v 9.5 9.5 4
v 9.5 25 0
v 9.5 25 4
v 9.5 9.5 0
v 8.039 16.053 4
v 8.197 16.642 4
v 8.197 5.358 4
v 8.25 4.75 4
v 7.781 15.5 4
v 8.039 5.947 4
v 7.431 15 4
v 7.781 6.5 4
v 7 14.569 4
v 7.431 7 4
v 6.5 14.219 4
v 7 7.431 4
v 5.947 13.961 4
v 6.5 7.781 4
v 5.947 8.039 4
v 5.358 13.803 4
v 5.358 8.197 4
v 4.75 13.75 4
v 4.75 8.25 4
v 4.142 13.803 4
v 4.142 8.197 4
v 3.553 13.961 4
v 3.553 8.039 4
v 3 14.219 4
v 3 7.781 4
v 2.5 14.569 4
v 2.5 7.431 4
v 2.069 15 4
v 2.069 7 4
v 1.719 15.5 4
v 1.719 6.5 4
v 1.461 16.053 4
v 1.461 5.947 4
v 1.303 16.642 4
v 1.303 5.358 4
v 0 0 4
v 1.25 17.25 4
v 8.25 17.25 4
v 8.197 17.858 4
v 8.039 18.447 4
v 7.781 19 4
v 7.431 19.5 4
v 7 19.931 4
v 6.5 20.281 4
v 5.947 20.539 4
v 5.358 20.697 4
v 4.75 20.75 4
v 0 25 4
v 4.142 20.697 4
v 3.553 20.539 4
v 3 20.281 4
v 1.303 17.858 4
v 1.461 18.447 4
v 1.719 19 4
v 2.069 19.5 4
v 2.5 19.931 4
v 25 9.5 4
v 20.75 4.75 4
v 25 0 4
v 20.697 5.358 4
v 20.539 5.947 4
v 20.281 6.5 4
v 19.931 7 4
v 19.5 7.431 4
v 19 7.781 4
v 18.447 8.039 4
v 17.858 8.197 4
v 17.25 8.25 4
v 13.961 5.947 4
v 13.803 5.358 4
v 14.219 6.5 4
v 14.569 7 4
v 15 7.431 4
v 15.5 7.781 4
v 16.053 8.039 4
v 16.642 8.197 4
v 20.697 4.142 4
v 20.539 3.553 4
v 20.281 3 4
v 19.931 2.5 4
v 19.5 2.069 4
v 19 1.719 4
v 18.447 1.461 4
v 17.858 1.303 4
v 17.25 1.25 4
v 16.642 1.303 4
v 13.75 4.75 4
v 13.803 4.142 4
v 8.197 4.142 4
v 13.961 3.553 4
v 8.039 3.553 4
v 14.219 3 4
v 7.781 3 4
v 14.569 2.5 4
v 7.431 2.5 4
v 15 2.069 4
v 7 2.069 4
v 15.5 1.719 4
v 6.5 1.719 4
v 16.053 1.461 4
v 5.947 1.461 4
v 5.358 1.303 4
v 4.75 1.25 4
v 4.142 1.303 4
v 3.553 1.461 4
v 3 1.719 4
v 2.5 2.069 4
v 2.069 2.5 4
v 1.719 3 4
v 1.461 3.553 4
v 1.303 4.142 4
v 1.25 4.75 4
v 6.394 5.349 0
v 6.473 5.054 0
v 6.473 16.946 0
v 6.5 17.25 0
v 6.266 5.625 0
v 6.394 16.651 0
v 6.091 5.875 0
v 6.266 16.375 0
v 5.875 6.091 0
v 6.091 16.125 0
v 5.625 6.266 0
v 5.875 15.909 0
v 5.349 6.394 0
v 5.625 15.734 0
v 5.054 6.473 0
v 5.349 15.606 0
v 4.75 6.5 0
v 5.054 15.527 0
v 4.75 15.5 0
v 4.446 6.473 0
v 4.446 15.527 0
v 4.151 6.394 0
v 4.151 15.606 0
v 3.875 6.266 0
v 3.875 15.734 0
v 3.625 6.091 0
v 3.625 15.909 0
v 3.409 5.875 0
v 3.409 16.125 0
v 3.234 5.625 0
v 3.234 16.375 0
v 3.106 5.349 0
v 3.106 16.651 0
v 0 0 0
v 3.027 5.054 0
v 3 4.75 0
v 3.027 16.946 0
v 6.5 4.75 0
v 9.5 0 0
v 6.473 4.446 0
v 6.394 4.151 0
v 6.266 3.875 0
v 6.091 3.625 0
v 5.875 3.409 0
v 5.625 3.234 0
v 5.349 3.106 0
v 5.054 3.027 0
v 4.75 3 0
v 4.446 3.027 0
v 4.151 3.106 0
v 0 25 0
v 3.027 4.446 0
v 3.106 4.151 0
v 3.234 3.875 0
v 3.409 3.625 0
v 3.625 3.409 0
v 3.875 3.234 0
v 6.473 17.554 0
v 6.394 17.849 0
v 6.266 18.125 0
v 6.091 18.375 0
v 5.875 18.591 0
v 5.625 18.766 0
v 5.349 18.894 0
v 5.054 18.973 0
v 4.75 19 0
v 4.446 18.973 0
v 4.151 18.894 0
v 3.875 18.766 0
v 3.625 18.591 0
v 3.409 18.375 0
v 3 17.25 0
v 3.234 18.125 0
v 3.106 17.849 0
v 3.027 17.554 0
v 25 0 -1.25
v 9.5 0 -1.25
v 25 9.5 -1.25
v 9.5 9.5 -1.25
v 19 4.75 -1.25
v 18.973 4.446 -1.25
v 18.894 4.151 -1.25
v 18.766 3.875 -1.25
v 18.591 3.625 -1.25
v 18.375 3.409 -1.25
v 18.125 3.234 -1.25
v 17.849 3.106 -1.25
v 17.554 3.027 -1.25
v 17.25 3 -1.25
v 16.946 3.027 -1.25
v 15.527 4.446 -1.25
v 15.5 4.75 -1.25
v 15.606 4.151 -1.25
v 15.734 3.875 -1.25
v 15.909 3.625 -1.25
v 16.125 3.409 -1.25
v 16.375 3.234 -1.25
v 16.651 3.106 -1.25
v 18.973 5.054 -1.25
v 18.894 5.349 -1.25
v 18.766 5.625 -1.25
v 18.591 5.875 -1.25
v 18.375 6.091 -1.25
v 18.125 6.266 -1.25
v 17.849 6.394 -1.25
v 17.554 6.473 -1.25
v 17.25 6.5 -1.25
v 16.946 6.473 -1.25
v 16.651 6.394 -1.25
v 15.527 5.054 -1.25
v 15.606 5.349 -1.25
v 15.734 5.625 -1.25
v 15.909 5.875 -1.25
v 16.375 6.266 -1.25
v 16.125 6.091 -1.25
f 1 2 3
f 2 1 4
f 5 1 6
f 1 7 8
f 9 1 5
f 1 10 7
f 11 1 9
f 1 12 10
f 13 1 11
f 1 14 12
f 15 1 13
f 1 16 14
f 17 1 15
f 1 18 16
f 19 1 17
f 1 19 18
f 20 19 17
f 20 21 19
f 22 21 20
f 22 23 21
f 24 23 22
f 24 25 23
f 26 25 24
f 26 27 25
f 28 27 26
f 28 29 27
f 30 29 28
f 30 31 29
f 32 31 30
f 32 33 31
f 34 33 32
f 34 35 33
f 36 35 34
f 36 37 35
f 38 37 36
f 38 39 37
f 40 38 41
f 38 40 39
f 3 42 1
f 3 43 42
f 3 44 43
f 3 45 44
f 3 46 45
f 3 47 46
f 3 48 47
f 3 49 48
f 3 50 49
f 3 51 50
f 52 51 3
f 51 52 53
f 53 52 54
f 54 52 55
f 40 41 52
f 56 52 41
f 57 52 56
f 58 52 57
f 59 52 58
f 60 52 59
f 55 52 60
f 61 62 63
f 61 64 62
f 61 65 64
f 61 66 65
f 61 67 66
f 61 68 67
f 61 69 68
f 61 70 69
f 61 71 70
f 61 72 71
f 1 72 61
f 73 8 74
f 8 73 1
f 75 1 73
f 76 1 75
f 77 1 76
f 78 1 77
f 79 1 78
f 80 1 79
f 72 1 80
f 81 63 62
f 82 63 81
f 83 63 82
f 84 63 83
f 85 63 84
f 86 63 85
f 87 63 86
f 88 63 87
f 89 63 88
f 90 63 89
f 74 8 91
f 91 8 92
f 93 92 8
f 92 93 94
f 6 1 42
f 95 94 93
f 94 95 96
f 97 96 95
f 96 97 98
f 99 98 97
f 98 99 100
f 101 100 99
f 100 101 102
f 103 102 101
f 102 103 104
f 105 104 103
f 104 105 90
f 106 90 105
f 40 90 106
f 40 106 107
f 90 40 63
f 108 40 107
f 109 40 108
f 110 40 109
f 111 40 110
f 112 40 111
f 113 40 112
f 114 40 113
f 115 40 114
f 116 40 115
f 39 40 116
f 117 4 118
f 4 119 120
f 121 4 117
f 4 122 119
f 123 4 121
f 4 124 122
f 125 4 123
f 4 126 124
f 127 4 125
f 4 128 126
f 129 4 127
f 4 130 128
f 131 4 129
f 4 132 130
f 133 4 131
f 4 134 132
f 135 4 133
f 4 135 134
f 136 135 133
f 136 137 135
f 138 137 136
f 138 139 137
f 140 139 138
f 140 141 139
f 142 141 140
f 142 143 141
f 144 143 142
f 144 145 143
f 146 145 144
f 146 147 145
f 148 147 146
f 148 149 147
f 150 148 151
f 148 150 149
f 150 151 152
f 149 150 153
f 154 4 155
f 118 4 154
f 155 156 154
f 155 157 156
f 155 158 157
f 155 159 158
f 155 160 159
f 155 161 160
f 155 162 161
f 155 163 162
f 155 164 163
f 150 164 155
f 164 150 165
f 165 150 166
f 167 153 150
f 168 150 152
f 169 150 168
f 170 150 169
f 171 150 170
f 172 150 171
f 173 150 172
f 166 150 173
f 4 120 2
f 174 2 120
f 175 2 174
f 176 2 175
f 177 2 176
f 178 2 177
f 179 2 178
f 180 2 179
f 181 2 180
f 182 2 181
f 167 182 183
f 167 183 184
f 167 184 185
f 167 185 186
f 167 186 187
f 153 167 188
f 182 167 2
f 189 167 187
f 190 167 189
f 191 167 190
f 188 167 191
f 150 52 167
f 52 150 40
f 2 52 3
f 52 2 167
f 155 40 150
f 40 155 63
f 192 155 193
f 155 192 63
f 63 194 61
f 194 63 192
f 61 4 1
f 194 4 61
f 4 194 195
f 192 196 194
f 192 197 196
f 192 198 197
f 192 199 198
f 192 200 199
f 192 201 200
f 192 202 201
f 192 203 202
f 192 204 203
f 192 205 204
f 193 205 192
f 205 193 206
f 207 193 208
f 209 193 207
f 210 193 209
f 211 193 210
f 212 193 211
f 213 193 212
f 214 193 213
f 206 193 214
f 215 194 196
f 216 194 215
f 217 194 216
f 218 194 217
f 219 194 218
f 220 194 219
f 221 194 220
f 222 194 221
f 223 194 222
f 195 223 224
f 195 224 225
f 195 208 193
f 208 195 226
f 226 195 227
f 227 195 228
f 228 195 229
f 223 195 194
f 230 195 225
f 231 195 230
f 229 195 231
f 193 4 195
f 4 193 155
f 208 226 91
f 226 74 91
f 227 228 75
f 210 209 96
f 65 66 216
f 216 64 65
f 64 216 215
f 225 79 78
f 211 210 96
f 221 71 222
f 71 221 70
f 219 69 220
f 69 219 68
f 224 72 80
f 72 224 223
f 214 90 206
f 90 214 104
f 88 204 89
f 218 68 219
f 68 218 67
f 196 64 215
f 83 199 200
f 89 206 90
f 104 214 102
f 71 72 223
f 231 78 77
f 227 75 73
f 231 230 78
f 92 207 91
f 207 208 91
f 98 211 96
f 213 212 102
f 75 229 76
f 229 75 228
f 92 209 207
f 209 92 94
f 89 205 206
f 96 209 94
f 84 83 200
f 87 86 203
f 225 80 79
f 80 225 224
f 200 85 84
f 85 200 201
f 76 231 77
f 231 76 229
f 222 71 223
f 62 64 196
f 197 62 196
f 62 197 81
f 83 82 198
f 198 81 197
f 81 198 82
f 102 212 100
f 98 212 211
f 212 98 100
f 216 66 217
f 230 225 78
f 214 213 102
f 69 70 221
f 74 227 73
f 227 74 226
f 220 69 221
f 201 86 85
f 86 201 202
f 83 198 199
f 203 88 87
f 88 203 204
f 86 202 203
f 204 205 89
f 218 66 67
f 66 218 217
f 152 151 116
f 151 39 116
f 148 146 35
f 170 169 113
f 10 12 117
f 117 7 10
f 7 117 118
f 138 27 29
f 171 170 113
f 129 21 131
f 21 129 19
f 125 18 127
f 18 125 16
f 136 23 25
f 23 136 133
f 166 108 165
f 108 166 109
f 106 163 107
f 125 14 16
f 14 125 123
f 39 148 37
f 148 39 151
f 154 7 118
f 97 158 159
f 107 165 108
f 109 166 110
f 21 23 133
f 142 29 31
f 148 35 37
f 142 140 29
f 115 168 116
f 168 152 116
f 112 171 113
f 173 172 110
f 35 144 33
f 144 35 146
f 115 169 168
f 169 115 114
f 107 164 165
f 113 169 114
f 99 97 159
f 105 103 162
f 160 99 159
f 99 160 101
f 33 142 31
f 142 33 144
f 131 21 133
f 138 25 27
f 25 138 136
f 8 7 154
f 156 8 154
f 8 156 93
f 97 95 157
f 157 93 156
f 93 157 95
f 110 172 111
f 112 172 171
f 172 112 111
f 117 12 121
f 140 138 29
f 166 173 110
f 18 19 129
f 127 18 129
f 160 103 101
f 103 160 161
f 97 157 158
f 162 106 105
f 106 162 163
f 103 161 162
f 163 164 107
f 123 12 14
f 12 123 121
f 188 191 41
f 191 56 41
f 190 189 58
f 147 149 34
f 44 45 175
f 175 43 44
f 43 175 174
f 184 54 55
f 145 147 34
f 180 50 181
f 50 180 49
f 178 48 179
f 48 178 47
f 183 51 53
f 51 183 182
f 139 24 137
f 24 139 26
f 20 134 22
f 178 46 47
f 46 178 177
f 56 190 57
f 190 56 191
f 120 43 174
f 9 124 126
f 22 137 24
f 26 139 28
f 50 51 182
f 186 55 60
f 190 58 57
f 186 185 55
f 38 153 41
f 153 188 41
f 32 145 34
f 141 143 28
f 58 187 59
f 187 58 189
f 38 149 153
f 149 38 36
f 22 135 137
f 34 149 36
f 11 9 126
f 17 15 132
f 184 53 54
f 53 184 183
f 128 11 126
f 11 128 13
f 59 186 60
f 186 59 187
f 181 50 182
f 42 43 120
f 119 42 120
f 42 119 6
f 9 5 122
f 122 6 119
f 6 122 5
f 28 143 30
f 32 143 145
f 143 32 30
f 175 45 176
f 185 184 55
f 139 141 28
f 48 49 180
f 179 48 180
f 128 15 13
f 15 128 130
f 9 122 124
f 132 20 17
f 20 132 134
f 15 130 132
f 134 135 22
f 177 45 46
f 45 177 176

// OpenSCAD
$fn=36;

db=9.5;
l=25;
df=4;
diff=1.25;

s1=7;
s2=3.5;

module fuss()
{
cube([db, l, df]);

cube([l, db, df]);

translate([db, 0, -diff])
cube([l-db, db, df]);
}
module schraube(hs)
{
    color("blue")
rotate([0,180,0])
cylinder(h=hs, d1=s1, d2=s2);
}

module schrauben()
{
translate([l-((l-db)/2),db/2,df])
schraube(df+diff);

translate([db/2,db/2,df])
schraube(df);

translate([db/2,l-((l-db)/2),df])
schraube(df);
}

difference()
{
    fuss();
    schrauben();
}
